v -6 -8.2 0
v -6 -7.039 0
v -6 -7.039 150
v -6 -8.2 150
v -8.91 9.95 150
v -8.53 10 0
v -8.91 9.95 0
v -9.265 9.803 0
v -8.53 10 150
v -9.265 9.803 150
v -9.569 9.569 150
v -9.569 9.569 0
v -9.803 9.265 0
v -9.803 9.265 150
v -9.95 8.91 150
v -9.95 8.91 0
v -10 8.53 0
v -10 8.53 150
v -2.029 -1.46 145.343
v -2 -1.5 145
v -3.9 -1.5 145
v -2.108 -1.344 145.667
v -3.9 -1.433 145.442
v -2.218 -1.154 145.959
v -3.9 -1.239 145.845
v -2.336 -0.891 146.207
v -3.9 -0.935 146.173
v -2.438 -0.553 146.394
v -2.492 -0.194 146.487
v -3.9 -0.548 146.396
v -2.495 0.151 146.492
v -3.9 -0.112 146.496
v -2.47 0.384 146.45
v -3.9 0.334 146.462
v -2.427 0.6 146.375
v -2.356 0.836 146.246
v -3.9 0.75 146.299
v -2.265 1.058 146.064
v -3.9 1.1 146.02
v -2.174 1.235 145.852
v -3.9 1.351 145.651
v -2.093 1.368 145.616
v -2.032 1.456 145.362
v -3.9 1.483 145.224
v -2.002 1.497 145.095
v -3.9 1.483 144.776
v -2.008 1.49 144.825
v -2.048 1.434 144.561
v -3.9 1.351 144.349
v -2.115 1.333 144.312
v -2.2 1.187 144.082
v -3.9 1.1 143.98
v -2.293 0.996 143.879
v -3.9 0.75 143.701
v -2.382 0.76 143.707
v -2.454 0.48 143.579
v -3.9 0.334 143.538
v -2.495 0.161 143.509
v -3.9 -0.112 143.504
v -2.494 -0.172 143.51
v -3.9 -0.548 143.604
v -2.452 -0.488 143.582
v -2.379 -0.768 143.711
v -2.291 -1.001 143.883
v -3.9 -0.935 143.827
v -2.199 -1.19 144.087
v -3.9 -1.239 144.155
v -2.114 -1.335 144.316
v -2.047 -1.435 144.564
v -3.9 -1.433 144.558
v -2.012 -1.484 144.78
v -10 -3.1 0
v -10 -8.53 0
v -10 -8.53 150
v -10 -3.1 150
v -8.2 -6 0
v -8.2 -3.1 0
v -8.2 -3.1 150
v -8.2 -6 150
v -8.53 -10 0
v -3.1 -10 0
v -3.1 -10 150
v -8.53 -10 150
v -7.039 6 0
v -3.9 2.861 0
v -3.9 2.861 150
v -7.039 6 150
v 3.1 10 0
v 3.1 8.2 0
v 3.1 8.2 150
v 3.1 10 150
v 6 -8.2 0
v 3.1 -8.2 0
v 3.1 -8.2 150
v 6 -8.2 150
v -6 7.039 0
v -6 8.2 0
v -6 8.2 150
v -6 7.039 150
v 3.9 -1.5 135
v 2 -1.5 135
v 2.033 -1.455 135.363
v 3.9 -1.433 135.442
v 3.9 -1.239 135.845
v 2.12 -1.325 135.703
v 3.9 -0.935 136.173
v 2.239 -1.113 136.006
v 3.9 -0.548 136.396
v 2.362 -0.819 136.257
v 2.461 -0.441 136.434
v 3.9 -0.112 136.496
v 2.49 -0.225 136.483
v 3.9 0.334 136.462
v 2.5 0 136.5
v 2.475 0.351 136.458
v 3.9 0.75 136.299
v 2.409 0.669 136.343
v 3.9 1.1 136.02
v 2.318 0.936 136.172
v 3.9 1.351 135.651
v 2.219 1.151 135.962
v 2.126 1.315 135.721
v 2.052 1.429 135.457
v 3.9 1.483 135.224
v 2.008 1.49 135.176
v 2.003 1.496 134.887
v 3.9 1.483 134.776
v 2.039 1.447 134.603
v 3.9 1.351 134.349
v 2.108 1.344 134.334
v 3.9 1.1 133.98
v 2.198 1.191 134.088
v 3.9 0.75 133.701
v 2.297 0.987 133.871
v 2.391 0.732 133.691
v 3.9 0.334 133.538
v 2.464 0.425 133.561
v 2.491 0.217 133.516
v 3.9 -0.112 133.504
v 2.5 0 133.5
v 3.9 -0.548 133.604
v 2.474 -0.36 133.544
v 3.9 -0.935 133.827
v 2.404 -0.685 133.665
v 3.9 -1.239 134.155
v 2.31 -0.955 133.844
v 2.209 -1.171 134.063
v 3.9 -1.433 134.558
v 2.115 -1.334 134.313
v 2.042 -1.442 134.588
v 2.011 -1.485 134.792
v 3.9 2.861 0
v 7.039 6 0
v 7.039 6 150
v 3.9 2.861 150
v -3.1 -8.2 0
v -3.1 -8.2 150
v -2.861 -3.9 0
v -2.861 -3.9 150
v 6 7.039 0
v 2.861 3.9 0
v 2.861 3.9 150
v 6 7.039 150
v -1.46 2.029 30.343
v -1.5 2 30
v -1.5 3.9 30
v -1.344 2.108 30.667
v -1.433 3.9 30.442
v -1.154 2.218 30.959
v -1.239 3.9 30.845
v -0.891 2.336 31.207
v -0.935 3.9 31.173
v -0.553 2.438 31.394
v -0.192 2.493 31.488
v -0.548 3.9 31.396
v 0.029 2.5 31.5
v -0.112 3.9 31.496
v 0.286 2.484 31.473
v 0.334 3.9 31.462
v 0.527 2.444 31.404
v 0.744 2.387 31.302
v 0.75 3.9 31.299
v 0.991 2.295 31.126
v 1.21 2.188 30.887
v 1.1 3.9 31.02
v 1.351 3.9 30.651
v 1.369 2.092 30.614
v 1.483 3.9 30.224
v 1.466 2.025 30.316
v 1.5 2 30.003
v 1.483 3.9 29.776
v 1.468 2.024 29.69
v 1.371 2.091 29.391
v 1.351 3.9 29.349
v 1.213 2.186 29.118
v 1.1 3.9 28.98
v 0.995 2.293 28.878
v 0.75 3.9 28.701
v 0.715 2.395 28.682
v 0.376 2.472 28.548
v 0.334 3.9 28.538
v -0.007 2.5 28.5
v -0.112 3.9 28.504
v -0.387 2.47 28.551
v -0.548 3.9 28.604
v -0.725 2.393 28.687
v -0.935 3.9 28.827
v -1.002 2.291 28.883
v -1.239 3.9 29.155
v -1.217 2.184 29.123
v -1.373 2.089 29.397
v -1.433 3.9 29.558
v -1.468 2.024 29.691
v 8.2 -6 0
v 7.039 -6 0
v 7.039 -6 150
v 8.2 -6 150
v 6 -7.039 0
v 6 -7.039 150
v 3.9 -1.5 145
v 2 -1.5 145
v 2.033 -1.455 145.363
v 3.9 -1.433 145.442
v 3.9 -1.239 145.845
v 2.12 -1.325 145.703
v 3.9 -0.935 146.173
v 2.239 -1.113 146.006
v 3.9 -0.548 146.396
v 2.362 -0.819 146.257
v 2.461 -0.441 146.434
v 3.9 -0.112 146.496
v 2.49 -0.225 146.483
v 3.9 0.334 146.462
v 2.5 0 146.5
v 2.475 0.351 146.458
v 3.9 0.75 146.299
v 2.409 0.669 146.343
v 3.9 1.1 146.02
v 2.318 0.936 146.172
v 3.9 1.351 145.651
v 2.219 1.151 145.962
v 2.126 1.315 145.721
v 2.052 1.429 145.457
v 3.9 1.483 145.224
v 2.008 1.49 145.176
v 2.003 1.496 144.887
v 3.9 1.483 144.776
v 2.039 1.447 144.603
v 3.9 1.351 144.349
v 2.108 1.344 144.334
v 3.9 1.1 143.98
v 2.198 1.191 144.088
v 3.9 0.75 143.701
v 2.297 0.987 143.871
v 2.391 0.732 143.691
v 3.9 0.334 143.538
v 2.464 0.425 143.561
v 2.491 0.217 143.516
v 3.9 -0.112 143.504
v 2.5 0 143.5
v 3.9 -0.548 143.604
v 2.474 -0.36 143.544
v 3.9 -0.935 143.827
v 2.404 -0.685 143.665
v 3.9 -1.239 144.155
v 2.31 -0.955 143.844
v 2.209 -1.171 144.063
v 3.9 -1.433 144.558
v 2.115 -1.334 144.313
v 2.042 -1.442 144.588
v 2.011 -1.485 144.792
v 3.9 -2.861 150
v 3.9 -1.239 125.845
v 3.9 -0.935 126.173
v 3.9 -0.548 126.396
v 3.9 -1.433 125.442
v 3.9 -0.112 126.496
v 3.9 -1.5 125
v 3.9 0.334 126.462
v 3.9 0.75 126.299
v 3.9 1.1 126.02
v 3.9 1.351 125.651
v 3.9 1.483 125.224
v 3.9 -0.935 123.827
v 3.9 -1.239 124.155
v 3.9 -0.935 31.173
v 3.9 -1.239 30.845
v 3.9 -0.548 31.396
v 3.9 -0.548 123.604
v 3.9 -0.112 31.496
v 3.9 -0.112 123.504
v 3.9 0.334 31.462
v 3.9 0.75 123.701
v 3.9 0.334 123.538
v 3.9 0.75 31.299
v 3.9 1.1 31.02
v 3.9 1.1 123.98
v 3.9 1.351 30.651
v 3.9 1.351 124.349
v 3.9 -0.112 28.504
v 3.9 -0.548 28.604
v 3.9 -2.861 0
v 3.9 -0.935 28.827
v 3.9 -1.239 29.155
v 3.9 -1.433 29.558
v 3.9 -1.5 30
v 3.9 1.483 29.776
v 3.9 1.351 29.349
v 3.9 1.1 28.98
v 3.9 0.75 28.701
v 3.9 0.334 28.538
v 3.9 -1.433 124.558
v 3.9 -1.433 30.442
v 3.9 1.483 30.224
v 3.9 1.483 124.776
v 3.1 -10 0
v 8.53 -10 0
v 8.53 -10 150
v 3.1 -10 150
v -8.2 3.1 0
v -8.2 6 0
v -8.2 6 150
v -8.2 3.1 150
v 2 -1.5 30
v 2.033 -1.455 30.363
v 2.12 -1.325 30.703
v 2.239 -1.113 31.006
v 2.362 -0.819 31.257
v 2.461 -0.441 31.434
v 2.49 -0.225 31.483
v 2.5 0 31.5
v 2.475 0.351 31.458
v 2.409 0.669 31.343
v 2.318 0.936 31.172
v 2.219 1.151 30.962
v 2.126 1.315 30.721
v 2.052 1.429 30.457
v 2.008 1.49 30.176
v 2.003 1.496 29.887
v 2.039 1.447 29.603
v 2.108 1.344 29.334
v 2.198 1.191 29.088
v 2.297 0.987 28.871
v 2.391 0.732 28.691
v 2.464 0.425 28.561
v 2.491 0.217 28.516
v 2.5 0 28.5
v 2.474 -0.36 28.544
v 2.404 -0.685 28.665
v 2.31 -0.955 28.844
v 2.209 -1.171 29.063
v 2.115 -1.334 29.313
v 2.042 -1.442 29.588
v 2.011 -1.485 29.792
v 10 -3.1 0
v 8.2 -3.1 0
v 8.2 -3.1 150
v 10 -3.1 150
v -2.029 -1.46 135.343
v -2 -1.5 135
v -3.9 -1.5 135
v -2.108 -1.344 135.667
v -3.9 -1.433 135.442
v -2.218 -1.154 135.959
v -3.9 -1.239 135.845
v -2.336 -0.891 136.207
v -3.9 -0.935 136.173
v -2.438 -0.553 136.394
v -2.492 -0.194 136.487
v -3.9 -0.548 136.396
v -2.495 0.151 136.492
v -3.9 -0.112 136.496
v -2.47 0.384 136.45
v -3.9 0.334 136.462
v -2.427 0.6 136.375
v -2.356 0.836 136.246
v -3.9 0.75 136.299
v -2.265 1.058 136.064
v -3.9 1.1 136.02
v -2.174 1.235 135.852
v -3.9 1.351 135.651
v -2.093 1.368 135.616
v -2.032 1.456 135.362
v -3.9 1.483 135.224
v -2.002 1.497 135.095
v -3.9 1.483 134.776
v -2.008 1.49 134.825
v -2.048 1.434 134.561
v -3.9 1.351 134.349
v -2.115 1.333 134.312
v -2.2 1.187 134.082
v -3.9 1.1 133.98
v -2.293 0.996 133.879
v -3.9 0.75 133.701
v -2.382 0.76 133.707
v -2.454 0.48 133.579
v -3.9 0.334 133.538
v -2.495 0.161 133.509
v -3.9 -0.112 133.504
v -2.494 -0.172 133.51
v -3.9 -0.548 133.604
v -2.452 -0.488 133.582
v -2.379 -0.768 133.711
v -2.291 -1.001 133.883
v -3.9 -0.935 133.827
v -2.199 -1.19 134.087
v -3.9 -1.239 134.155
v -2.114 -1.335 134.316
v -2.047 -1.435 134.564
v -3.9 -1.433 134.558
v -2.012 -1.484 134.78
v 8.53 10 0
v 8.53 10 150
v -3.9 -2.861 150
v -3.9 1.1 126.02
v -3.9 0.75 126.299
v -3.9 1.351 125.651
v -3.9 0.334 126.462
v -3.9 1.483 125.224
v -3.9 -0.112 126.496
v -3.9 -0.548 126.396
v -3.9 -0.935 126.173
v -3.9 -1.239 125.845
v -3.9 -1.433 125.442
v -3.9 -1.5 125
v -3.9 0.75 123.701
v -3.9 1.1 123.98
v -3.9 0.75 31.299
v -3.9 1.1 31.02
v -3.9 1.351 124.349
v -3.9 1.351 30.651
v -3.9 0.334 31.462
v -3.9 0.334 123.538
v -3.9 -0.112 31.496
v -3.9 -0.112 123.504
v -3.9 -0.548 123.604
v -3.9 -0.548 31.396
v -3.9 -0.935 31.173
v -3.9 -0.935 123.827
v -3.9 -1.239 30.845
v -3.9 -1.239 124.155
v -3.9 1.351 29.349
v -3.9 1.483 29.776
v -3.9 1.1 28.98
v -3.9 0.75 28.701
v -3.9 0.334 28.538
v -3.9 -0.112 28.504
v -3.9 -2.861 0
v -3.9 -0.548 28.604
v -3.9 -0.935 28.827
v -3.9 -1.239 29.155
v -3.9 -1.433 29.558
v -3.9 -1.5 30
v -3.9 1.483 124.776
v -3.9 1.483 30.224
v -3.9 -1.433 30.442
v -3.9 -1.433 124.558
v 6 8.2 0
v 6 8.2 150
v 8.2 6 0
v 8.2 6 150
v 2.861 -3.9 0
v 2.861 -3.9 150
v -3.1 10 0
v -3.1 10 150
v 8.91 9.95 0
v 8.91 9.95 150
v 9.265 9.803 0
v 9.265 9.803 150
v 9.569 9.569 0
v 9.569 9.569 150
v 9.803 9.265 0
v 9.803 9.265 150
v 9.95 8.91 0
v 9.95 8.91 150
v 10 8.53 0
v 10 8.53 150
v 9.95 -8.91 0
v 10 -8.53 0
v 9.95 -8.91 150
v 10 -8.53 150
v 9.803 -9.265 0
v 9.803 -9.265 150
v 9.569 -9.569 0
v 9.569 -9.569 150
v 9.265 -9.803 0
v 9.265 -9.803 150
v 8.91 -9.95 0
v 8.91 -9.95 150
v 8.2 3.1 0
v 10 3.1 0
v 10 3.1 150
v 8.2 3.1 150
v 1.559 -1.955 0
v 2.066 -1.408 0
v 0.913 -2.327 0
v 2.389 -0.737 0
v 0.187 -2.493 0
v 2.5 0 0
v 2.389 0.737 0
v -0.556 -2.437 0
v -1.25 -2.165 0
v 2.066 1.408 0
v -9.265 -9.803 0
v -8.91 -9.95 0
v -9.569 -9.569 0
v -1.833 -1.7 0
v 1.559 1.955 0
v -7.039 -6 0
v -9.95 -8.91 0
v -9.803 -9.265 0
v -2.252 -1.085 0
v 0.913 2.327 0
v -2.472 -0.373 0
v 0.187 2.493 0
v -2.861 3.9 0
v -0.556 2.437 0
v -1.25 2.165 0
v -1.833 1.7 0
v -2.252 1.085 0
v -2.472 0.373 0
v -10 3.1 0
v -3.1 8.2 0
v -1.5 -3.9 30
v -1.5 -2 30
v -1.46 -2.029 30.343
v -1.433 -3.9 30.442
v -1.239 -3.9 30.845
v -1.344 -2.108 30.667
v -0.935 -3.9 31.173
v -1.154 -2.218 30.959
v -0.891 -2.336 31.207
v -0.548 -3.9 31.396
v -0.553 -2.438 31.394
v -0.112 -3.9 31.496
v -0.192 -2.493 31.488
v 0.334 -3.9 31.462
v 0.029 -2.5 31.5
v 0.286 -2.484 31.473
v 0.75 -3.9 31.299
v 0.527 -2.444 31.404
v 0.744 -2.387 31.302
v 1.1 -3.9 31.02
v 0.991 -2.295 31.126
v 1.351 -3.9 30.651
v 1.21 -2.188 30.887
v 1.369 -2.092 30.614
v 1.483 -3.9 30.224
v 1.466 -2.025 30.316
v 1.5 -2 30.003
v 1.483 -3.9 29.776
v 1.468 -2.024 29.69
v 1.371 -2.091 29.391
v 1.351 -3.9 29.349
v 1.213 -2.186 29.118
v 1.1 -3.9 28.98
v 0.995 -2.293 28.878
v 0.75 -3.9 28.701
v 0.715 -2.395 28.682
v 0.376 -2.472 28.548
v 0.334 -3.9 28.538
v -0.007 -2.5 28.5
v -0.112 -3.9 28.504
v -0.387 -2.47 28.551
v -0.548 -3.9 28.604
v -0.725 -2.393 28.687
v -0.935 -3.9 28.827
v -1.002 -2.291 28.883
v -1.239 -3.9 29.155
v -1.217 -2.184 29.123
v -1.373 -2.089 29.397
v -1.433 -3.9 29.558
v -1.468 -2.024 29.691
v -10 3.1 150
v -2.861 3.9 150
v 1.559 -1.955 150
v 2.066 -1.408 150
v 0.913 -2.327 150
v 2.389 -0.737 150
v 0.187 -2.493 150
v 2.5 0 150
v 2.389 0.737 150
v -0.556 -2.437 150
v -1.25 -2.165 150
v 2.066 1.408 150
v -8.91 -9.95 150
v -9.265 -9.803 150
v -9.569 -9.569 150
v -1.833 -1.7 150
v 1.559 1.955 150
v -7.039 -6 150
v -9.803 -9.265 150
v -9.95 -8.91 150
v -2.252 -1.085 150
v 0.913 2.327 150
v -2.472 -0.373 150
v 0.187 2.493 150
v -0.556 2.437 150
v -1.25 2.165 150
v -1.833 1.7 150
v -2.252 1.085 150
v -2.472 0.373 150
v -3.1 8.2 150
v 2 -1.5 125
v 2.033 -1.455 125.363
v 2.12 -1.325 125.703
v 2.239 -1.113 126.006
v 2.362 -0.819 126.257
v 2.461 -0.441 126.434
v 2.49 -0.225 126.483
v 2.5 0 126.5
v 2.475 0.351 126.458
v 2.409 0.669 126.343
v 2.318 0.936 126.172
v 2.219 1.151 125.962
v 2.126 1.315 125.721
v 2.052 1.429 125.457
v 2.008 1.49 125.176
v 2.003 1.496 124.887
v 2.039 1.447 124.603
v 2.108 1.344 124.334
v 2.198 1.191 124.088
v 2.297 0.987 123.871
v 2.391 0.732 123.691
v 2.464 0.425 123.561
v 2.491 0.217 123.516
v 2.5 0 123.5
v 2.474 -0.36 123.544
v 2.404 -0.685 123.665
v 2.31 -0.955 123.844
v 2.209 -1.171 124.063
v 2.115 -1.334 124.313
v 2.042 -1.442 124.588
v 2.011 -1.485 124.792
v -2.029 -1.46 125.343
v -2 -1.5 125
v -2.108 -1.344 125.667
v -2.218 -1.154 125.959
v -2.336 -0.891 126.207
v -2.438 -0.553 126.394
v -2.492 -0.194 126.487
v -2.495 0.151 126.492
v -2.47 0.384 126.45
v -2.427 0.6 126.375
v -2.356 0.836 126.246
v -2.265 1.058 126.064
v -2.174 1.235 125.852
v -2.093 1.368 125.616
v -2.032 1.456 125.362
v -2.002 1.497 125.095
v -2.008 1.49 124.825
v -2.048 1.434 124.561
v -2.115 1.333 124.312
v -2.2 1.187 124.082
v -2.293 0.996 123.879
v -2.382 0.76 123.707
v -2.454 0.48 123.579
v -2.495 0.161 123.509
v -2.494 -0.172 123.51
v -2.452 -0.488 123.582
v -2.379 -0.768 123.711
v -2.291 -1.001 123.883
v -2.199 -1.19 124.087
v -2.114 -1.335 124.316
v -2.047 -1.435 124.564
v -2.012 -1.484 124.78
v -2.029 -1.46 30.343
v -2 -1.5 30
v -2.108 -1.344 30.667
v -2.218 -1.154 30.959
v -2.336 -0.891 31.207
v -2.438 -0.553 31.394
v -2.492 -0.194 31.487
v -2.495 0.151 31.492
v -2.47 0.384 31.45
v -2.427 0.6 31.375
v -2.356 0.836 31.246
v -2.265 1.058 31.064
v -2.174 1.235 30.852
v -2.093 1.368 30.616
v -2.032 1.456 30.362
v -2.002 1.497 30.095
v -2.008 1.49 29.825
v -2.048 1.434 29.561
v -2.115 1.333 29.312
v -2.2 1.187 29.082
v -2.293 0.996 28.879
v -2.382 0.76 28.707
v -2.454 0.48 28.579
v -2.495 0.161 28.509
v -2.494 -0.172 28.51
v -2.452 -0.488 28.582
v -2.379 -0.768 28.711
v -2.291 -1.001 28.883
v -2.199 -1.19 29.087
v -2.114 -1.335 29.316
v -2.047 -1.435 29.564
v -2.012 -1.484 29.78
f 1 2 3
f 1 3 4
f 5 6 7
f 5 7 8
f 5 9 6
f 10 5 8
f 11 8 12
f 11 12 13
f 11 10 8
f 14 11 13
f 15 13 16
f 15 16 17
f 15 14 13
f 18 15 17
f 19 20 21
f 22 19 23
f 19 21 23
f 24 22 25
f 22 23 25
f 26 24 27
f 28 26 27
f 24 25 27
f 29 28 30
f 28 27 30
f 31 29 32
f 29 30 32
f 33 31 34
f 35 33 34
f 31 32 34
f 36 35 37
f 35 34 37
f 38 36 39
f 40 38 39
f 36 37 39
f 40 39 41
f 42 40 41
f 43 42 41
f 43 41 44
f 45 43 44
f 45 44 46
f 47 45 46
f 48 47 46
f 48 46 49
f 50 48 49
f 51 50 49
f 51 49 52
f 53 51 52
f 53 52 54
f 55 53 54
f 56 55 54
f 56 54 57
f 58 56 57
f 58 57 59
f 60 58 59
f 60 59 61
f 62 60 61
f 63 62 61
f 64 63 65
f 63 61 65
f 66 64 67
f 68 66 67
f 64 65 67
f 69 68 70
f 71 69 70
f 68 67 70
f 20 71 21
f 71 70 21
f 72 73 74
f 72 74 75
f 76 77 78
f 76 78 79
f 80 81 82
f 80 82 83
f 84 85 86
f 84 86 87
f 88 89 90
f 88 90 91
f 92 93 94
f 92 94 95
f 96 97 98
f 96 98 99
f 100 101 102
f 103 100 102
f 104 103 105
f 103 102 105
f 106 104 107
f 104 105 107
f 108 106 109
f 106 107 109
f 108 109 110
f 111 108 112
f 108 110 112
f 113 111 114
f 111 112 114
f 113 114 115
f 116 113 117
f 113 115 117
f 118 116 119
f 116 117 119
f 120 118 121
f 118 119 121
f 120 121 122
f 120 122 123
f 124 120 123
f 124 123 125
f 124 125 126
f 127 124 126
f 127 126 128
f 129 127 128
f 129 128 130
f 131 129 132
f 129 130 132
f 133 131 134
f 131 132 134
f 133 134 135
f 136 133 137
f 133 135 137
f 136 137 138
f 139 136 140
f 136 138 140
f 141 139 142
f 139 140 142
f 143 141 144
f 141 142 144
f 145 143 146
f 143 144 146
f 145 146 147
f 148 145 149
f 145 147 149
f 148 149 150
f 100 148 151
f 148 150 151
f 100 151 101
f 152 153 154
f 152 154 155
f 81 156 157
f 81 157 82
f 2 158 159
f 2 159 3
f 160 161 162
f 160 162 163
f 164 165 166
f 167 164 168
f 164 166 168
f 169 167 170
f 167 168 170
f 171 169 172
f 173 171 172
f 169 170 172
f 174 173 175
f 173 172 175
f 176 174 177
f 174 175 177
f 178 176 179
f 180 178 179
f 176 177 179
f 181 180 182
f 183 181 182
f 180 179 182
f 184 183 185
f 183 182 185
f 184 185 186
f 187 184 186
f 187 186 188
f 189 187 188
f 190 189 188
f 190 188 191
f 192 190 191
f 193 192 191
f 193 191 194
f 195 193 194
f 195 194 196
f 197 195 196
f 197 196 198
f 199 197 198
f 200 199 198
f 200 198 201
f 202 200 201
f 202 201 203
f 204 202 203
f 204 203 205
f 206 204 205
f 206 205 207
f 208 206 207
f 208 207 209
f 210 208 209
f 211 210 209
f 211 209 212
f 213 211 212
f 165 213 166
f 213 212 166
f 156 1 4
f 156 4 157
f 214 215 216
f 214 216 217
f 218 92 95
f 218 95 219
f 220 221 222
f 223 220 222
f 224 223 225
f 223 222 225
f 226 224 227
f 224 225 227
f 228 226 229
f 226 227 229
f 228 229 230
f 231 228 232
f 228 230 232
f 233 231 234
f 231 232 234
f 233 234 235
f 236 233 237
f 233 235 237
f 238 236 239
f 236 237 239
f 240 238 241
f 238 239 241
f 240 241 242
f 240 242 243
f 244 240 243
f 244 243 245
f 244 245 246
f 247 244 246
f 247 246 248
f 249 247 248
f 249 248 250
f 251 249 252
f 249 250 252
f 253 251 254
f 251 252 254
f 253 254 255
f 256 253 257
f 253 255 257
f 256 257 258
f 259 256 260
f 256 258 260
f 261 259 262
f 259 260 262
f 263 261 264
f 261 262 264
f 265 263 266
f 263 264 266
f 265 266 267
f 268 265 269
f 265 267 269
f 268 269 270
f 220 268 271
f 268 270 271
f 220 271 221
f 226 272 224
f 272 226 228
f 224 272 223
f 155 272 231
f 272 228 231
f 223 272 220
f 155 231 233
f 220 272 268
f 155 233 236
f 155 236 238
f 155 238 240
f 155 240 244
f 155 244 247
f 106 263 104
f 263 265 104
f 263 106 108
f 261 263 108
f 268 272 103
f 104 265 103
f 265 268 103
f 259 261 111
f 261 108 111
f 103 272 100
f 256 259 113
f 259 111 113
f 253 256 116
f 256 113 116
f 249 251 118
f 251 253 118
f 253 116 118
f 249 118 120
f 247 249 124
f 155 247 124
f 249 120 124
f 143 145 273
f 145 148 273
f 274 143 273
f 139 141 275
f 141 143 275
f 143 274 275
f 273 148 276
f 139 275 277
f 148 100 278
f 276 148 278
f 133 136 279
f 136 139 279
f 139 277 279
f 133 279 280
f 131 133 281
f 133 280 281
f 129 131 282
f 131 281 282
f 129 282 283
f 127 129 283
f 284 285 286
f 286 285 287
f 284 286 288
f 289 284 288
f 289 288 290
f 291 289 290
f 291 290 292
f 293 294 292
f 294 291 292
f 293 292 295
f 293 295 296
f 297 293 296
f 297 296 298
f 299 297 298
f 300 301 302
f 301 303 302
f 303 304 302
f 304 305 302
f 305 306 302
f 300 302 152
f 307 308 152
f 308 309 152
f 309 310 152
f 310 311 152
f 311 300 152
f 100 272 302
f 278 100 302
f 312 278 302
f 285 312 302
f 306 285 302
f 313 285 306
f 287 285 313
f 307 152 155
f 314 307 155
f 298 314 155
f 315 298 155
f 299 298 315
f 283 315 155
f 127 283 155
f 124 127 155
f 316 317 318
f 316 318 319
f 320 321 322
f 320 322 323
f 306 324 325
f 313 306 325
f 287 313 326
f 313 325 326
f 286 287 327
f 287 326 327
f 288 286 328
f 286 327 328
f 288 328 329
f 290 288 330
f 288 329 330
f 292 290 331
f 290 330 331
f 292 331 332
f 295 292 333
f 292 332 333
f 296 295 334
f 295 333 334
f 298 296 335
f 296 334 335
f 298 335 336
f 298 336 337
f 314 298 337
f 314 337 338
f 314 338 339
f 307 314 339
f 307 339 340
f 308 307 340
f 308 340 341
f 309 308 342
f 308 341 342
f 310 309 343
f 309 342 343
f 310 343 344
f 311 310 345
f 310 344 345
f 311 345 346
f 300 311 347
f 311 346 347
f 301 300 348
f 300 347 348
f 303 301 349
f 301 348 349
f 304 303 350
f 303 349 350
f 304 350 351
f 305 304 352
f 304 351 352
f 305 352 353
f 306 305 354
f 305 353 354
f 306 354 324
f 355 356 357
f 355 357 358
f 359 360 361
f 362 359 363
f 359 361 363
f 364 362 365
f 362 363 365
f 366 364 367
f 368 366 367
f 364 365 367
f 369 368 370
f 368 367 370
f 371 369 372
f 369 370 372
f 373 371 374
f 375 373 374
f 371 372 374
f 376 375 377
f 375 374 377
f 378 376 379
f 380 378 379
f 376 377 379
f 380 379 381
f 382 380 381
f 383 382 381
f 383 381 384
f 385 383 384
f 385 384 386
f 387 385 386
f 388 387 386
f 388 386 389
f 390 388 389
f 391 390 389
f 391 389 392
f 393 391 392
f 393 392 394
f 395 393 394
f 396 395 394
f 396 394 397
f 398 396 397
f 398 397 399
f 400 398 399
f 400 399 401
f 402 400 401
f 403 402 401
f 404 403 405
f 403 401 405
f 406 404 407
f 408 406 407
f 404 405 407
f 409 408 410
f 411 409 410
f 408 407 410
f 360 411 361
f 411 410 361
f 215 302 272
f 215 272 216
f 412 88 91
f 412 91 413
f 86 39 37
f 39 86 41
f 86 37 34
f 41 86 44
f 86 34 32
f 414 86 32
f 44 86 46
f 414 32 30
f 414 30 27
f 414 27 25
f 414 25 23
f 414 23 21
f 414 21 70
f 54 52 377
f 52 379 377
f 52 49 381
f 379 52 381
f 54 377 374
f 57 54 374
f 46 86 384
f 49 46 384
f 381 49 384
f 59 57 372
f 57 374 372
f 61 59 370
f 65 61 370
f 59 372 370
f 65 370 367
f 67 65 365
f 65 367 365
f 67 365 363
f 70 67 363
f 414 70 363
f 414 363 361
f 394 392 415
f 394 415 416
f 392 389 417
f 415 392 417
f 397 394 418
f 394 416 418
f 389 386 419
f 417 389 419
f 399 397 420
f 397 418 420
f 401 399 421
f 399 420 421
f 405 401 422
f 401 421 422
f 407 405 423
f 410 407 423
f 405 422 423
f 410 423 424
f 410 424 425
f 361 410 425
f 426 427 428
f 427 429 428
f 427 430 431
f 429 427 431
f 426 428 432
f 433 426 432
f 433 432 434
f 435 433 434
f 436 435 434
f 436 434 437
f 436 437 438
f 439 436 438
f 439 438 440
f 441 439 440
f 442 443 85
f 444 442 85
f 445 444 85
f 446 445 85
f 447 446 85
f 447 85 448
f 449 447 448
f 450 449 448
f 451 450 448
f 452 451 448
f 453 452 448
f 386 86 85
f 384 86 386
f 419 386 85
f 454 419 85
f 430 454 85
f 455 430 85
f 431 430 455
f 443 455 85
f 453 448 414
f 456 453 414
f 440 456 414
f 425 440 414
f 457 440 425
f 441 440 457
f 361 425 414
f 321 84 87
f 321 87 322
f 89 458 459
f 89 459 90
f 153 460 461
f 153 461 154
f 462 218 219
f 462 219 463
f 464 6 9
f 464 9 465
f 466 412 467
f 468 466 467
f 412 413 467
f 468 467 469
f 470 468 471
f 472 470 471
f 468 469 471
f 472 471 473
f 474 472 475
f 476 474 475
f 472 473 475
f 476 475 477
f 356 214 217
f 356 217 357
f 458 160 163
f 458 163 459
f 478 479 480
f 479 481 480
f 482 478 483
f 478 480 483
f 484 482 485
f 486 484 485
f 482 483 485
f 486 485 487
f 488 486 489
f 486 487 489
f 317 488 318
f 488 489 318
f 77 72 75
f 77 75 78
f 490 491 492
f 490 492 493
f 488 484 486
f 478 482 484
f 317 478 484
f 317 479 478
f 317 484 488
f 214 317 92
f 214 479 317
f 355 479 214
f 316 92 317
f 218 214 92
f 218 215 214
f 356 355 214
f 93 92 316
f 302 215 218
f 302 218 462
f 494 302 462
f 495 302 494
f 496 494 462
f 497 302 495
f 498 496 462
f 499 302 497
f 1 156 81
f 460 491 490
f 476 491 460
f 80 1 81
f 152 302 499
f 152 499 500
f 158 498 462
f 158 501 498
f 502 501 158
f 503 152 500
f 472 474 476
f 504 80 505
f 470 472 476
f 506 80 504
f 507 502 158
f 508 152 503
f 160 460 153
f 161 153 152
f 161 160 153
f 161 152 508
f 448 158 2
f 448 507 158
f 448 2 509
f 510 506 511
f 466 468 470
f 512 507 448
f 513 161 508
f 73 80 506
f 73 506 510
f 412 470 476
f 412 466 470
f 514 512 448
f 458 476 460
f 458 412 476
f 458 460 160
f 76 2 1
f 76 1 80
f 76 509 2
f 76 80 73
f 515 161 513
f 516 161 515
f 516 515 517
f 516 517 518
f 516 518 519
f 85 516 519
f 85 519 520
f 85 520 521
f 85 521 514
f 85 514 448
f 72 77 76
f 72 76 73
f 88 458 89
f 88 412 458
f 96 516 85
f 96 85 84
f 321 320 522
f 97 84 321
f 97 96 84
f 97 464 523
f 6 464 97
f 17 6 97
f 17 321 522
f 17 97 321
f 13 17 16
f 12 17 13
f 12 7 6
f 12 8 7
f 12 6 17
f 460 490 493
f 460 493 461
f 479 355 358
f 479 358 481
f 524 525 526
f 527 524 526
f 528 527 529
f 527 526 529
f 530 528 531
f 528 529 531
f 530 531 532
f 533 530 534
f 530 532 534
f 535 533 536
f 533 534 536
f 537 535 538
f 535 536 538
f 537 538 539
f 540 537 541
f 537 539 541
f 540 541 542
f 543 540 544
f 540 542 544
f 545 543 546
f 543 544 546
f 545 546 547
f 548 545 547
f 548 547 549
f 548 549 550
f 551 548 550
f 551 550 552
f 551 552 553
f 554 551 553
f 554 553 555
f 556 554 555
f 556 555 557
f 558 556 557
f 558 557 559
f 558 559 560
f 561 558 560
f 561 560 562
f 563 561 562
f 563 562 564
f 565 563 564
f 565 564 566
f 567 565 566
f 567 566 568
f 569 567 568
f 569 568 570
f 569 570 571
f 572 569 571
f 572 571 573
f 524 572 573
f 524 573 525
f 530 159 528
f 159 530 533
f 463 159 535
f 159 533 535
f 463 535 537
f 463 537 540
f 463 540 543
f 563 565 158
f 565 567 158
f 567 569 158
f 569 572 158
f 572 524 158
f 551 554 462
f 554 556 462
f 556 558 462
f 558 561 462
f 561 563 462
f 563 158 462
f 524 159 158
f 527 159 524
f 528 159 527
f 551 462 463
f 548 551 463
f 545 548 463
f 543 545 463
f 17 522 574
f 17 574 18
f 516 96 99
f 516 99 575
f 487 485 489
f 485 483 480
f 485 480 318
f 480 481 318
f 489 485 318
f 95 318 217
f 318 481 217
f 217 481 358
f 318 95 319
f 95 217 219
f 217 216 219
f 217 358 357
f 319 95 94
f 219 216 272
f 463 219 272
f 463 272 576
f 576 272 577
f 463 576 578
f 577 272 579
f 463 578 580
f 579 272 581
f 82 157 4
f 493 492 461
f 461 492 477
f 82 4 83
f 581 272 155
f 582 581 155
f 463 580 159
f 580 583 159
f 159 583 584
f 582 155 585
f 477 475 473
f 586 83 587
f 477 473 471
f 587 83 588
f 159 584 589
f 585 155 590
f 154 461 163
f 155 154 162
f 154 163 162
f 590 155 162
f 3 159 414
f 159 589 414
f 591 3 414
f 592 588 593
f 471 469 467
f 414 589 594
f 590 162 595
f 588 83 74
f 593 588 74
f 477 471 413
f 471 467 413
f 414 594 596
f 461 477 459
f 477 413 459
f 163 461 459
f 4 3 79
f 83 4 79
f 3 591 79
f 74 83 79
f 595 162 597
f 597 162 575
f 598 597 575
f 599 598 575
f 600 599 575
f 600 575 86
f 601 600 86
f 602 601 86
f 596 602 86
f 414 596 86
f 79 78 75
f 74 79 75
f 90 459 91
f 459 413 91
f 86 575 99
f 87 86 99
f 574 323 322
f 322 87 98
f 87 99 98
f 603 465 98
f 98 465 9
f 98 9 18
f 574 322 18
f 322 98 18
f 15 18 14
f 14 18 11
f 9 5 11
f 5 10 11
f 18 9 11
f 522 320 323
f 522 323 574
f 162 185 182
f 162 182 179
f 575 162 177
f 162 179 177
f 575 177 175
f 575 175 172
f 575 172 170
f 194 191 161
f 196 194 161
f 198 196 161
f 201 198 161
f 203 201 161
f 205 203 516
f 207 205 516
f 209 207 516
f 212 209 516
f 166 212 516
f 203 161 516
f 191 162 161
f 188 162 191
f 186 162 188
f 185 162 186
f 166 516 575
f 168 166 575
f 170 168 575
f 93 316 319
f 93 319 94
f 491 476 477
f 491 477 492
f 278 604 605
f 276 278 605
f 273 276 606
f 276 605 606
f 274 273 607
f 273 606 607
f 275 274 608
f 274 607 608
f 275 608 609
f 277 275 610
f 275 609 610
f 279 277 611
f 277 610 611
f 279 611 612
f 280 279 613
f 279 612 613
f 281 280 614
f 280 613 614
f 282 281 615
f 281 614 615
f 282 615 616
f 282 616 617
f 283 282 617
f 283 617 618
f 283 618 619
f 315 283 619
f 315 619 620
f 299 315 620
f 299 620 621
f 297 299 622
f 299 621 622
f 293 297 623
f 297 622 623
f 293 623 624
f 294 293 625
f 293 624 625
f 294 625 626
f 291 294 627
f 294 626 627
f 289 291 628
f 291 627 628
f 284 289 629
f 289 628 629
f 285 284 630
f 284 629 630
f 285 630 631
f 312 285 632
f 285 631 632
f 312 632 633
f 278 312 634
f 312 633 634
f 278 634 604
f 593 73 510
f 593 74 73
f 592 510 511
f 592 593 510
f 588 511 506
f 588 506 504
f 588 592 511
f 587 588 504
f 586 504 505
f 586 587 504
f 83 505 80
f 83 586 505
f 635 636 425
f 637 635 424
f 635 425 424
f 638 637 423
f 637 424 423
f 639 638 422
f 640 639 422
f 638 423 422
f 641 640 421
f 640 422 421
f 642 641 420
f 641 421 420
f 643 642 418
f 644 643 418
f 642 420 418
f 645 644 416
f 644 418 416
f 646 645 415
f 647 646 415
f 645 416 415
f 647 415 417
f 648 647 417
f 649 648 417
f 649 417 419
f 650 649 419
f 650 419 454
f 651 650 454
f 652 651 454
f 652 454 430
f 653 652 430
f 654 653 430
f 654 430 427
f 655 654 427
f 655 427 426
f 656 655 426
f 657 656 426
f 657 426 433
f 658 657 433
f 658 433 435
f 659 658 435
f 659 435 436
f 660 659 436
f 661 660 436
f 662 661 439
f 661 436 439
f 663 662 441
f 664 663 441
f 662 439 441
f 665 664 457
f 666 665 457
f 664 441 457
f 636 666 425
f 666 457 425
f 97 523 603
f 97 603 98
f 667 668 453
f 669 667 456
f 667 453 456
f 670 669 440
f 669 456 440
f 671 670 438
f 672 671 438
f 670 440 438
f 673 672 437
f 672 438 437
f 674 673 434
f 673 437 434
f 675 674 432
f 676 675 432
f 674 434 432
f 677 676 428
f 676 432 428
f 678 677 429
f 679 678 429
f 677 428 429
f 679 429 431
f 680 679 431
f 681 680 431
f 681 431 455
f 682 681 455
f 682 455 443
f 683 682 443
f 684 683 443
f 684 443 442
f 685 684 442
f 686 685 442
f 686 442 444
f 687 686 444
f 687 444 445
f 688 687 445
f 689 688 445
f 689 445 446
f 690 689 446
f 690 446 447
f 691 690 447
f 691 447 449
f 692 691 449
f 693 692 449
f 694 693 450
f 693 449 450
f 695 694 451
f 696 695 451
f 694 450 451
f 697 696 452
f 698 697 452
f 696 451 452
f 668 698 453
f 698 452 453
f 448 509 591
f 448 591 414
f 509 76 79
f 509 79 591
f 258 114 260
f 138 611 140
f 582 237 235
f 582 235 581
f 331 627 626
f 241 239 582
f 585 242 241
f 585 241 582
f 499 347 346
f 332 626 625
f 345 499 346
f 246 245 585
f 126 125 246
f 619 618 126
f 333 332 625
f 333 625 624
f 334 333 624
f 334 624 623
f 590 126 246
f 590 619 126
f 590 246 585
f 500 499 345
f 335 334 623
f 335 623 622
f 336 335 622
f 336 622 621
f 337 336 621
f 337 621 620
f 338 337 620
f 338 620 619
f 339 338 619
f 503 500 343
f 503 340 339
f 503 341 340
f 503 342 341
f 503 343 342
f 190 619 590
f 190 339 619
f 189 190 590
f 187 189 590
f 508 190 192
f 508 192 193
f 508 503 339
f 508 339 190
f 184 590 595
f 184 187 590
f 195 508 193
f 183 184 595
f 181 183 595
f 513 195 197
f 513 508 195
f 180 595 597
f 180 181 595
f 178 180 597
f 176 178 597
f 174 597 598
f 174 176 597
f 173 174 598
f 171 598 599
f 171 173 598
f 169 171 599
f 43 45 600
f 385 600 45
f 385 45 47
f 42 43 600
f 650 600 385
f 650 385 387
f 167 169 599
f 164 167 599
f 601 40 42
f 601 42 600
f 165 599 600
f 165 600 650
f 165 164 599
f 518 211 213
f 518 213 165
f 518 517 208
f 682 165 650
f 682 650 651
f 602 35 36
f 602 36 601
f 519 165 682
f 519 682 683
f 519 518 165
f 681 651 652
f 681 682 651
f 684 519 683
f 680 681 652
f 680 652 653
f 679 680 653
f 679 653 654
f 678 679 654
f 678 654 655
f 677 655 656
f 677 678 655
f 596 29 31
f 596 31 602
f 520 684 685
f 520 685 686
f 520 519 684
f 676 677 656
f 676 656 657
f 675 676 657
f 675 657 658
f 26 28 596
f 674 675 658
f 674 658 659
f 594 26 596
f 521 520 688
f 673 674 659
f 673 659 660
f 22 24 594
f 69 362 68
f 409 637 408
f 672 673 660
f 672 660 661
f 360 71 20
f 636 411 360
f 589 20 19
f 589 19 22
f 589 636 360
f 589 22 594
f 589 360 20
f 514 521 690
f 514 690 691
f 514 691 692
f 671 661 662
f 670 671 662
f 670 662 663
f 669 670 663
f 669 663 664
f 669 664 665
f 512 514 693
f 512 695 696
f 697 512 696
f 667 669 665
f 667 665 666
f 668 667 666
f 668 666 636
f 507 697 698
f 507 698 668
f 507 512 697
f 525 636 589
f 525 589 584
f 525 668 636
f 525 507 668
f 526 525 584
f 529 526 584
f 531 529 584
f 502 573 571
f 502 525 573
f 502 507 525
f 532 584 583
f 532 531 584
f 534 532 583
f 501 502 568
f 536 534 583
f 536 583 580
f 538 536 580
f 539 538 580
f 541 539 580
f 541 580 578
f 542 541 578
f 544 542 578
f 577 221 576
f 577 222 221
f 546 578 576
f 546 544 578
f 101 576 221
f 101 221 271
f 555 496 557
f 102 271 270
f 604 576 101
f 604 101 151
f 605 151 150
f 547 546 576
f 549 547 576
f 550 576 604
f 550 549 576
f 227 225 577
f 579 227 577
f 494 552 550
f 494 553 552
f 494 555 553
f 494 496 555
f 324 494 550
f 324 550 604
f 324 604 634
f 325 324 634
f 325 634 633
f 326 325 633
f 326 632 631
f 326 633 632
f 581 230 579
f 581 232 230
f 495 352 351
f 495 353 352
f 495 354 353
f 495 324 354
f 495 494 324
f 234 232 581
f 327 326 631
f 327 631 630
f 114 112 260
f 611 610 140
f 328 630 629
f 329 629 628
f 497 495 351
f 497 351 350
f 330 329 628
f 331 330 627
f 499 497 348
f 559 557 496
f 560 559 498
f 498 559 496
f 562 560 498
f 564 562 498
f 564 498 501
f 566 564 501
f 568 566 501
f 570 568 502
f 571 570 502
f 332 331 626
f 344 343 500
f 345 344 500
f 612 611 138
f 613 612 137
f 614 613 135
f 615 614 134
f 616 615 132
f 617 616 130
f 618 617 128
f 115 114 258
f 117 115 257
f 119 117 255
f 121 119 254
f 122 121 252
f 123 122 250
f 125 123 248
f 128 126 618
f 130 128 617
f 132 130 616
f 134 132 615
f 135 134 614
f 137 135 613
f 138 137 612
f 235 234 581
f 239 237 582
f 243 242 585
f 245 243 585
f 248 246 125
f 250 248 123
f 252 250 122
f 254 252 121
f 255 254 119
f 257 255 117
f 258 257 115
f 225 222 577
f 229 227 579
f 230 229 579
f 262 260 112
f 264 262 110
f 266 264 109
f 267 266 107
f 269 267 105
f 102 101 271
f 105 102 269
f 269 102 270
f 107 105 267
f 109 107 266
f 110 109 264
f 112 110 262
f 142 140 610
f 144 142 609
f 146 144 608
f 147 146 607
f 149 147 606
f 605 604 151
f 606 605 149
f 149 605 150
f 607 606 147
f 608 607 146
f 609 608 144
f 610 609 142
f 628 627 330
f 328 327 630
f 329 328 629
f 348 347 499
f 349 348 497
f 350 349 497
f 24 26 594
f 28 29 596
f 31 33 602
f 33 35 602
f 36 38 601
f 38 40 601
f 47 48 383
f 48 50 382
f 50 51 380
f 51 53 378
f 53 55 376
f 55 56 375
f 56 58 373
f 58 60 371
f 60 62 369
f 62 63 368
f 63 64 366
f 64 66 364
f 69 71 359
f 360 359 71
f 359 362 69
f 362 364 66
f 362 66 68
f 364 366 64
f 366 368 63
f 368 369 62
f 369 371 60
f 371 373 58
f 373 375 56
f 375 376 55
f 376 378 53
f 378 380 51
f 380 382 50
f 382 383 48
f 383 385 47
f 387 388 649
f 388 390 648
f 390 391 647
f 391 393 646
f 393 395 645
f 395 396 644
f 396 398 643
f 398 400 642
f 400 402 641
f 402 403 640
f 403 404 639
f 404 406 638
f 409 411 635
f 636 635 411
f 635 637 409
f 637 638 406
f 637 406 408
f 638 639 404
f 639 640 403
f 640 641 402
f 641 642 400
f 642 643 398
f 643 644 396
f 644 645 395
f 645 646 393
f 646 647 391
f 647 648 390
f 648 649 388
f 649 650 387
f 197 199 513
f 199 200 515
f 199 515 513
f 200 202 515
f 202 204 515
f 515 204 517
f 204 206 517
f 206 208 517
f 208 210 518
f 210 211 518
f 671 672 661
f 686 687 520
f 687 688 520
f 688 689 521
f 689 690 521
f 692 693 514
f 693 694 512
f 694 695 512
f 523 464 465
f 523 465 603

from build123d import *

# Parameters (mm, degrees)
SKETCH1_R           = 2.5
BOSS_EXTRUDE1_DEPTH = 150
FILLET1_R           = 1.47
SKETCH2_R           = 1.5
CUT_EXTRUDE1_DEPTH  = 151.974203094
SKETCH3_R           = 1.5
CUT_EXTRUDE2_DEPTH  = 151.974203194


with BuildPart() as part:
    # Sketch1 → Boss-Extrude1 (new body)
    with BuildSketch(Plane.XY):
        Polygon((2.860553032, 3.9), (6, 7.039446968), (6, 8.2), (3.1, 8.2), (3.1, 10), (10, 10), (10, 3.1), (8.2, 3.1), (8.2, 6), (7.039446968, 6), (3.9, 2.860553032), (3.9, 0), (3.9, -2.860553032), (7.039446968, -6), (8.2, -6), (8.2, -3.1), (10, -3.1), (10, -10), (3.1, -10), (3.1, -8.2), (6, -8.2), (6, -7.039446968), (2.860553032, -3.9), (0, -3.9), (-2.860553032, -3.9), (-6, -7.039446968), (-6, -8.2), (-3.1, -8.2), (-3.1, -10), (-10, -10), (-10, -3.1), (-8.2, -3.1), (-8.2, -6), (-7.039446968, -6), (-3.9, -2.860553032), (-3.9, 0), (-3.9, 2.860553032), (-7.039446968, 6), (-8.2, 6), (-8.2, 3.1), (-10, 3.1), (-10, 10), (-3.1, 10), (-3.1, 8.2), (-6, 8.2), (-6, 7.039446968), (-2.860553032, 3.9), (0, 3.9), align=None)
        Circle(SKETCH1_R, mode=Mode.SUBTRACT)
    extrude(amount=BOSS_EXTRUDE1_DEPTH)

    # Fillet1
    fillet1_edges = [part.edges().sort_by_distance(p)[0] for p in [
        (10, -10, 75),
        (-10, -10, 75),
        (-10, 10, 75),
        (10, 10, 75),
    ]]
    fillet(fillet1_edges, radius=FILLET1_R)

    # Sketch2 → Cut-Extrude1 (cut, through all)
    with BuildSketch(Plane.ZY.offset(3.9)):
        with Locations(Location((145, 0, 0), (0, 0, 270))):
            Circle(SKETCH2_R)
        with Locations(Location((135, 0, 0), (0, 0, 270))):
            Circle(SKETCH2_R)
        with Locations(Location((125, 0, 0), (0, 0, 270))):
            Circle(SKETCH2_R)
        with Locations(Location((30, 0, 0), (0, 0, 270))):
            Circle(SKETCH2_R)
    extrude(amount=-CUT_EXTRUDE1_DEPTH, mode=Mode.SUBTRACT)

    # Sketch3 → Cut-Extrude2 (cut, through all)
    with BuildSketch(Plane(origin=(0, 3.9, 0), x_dir=(1, 0, 0), z_dir=(0, 1, 0))):
        with Locations(Location((0, -30, 0), (0, 0, 180))):
            Circle(SKETCH3_R)
    extrude(amount=-CUT_EXTRUDE2_DEPTH, mode=Mode.SUBTRACT)


solid = part.part
